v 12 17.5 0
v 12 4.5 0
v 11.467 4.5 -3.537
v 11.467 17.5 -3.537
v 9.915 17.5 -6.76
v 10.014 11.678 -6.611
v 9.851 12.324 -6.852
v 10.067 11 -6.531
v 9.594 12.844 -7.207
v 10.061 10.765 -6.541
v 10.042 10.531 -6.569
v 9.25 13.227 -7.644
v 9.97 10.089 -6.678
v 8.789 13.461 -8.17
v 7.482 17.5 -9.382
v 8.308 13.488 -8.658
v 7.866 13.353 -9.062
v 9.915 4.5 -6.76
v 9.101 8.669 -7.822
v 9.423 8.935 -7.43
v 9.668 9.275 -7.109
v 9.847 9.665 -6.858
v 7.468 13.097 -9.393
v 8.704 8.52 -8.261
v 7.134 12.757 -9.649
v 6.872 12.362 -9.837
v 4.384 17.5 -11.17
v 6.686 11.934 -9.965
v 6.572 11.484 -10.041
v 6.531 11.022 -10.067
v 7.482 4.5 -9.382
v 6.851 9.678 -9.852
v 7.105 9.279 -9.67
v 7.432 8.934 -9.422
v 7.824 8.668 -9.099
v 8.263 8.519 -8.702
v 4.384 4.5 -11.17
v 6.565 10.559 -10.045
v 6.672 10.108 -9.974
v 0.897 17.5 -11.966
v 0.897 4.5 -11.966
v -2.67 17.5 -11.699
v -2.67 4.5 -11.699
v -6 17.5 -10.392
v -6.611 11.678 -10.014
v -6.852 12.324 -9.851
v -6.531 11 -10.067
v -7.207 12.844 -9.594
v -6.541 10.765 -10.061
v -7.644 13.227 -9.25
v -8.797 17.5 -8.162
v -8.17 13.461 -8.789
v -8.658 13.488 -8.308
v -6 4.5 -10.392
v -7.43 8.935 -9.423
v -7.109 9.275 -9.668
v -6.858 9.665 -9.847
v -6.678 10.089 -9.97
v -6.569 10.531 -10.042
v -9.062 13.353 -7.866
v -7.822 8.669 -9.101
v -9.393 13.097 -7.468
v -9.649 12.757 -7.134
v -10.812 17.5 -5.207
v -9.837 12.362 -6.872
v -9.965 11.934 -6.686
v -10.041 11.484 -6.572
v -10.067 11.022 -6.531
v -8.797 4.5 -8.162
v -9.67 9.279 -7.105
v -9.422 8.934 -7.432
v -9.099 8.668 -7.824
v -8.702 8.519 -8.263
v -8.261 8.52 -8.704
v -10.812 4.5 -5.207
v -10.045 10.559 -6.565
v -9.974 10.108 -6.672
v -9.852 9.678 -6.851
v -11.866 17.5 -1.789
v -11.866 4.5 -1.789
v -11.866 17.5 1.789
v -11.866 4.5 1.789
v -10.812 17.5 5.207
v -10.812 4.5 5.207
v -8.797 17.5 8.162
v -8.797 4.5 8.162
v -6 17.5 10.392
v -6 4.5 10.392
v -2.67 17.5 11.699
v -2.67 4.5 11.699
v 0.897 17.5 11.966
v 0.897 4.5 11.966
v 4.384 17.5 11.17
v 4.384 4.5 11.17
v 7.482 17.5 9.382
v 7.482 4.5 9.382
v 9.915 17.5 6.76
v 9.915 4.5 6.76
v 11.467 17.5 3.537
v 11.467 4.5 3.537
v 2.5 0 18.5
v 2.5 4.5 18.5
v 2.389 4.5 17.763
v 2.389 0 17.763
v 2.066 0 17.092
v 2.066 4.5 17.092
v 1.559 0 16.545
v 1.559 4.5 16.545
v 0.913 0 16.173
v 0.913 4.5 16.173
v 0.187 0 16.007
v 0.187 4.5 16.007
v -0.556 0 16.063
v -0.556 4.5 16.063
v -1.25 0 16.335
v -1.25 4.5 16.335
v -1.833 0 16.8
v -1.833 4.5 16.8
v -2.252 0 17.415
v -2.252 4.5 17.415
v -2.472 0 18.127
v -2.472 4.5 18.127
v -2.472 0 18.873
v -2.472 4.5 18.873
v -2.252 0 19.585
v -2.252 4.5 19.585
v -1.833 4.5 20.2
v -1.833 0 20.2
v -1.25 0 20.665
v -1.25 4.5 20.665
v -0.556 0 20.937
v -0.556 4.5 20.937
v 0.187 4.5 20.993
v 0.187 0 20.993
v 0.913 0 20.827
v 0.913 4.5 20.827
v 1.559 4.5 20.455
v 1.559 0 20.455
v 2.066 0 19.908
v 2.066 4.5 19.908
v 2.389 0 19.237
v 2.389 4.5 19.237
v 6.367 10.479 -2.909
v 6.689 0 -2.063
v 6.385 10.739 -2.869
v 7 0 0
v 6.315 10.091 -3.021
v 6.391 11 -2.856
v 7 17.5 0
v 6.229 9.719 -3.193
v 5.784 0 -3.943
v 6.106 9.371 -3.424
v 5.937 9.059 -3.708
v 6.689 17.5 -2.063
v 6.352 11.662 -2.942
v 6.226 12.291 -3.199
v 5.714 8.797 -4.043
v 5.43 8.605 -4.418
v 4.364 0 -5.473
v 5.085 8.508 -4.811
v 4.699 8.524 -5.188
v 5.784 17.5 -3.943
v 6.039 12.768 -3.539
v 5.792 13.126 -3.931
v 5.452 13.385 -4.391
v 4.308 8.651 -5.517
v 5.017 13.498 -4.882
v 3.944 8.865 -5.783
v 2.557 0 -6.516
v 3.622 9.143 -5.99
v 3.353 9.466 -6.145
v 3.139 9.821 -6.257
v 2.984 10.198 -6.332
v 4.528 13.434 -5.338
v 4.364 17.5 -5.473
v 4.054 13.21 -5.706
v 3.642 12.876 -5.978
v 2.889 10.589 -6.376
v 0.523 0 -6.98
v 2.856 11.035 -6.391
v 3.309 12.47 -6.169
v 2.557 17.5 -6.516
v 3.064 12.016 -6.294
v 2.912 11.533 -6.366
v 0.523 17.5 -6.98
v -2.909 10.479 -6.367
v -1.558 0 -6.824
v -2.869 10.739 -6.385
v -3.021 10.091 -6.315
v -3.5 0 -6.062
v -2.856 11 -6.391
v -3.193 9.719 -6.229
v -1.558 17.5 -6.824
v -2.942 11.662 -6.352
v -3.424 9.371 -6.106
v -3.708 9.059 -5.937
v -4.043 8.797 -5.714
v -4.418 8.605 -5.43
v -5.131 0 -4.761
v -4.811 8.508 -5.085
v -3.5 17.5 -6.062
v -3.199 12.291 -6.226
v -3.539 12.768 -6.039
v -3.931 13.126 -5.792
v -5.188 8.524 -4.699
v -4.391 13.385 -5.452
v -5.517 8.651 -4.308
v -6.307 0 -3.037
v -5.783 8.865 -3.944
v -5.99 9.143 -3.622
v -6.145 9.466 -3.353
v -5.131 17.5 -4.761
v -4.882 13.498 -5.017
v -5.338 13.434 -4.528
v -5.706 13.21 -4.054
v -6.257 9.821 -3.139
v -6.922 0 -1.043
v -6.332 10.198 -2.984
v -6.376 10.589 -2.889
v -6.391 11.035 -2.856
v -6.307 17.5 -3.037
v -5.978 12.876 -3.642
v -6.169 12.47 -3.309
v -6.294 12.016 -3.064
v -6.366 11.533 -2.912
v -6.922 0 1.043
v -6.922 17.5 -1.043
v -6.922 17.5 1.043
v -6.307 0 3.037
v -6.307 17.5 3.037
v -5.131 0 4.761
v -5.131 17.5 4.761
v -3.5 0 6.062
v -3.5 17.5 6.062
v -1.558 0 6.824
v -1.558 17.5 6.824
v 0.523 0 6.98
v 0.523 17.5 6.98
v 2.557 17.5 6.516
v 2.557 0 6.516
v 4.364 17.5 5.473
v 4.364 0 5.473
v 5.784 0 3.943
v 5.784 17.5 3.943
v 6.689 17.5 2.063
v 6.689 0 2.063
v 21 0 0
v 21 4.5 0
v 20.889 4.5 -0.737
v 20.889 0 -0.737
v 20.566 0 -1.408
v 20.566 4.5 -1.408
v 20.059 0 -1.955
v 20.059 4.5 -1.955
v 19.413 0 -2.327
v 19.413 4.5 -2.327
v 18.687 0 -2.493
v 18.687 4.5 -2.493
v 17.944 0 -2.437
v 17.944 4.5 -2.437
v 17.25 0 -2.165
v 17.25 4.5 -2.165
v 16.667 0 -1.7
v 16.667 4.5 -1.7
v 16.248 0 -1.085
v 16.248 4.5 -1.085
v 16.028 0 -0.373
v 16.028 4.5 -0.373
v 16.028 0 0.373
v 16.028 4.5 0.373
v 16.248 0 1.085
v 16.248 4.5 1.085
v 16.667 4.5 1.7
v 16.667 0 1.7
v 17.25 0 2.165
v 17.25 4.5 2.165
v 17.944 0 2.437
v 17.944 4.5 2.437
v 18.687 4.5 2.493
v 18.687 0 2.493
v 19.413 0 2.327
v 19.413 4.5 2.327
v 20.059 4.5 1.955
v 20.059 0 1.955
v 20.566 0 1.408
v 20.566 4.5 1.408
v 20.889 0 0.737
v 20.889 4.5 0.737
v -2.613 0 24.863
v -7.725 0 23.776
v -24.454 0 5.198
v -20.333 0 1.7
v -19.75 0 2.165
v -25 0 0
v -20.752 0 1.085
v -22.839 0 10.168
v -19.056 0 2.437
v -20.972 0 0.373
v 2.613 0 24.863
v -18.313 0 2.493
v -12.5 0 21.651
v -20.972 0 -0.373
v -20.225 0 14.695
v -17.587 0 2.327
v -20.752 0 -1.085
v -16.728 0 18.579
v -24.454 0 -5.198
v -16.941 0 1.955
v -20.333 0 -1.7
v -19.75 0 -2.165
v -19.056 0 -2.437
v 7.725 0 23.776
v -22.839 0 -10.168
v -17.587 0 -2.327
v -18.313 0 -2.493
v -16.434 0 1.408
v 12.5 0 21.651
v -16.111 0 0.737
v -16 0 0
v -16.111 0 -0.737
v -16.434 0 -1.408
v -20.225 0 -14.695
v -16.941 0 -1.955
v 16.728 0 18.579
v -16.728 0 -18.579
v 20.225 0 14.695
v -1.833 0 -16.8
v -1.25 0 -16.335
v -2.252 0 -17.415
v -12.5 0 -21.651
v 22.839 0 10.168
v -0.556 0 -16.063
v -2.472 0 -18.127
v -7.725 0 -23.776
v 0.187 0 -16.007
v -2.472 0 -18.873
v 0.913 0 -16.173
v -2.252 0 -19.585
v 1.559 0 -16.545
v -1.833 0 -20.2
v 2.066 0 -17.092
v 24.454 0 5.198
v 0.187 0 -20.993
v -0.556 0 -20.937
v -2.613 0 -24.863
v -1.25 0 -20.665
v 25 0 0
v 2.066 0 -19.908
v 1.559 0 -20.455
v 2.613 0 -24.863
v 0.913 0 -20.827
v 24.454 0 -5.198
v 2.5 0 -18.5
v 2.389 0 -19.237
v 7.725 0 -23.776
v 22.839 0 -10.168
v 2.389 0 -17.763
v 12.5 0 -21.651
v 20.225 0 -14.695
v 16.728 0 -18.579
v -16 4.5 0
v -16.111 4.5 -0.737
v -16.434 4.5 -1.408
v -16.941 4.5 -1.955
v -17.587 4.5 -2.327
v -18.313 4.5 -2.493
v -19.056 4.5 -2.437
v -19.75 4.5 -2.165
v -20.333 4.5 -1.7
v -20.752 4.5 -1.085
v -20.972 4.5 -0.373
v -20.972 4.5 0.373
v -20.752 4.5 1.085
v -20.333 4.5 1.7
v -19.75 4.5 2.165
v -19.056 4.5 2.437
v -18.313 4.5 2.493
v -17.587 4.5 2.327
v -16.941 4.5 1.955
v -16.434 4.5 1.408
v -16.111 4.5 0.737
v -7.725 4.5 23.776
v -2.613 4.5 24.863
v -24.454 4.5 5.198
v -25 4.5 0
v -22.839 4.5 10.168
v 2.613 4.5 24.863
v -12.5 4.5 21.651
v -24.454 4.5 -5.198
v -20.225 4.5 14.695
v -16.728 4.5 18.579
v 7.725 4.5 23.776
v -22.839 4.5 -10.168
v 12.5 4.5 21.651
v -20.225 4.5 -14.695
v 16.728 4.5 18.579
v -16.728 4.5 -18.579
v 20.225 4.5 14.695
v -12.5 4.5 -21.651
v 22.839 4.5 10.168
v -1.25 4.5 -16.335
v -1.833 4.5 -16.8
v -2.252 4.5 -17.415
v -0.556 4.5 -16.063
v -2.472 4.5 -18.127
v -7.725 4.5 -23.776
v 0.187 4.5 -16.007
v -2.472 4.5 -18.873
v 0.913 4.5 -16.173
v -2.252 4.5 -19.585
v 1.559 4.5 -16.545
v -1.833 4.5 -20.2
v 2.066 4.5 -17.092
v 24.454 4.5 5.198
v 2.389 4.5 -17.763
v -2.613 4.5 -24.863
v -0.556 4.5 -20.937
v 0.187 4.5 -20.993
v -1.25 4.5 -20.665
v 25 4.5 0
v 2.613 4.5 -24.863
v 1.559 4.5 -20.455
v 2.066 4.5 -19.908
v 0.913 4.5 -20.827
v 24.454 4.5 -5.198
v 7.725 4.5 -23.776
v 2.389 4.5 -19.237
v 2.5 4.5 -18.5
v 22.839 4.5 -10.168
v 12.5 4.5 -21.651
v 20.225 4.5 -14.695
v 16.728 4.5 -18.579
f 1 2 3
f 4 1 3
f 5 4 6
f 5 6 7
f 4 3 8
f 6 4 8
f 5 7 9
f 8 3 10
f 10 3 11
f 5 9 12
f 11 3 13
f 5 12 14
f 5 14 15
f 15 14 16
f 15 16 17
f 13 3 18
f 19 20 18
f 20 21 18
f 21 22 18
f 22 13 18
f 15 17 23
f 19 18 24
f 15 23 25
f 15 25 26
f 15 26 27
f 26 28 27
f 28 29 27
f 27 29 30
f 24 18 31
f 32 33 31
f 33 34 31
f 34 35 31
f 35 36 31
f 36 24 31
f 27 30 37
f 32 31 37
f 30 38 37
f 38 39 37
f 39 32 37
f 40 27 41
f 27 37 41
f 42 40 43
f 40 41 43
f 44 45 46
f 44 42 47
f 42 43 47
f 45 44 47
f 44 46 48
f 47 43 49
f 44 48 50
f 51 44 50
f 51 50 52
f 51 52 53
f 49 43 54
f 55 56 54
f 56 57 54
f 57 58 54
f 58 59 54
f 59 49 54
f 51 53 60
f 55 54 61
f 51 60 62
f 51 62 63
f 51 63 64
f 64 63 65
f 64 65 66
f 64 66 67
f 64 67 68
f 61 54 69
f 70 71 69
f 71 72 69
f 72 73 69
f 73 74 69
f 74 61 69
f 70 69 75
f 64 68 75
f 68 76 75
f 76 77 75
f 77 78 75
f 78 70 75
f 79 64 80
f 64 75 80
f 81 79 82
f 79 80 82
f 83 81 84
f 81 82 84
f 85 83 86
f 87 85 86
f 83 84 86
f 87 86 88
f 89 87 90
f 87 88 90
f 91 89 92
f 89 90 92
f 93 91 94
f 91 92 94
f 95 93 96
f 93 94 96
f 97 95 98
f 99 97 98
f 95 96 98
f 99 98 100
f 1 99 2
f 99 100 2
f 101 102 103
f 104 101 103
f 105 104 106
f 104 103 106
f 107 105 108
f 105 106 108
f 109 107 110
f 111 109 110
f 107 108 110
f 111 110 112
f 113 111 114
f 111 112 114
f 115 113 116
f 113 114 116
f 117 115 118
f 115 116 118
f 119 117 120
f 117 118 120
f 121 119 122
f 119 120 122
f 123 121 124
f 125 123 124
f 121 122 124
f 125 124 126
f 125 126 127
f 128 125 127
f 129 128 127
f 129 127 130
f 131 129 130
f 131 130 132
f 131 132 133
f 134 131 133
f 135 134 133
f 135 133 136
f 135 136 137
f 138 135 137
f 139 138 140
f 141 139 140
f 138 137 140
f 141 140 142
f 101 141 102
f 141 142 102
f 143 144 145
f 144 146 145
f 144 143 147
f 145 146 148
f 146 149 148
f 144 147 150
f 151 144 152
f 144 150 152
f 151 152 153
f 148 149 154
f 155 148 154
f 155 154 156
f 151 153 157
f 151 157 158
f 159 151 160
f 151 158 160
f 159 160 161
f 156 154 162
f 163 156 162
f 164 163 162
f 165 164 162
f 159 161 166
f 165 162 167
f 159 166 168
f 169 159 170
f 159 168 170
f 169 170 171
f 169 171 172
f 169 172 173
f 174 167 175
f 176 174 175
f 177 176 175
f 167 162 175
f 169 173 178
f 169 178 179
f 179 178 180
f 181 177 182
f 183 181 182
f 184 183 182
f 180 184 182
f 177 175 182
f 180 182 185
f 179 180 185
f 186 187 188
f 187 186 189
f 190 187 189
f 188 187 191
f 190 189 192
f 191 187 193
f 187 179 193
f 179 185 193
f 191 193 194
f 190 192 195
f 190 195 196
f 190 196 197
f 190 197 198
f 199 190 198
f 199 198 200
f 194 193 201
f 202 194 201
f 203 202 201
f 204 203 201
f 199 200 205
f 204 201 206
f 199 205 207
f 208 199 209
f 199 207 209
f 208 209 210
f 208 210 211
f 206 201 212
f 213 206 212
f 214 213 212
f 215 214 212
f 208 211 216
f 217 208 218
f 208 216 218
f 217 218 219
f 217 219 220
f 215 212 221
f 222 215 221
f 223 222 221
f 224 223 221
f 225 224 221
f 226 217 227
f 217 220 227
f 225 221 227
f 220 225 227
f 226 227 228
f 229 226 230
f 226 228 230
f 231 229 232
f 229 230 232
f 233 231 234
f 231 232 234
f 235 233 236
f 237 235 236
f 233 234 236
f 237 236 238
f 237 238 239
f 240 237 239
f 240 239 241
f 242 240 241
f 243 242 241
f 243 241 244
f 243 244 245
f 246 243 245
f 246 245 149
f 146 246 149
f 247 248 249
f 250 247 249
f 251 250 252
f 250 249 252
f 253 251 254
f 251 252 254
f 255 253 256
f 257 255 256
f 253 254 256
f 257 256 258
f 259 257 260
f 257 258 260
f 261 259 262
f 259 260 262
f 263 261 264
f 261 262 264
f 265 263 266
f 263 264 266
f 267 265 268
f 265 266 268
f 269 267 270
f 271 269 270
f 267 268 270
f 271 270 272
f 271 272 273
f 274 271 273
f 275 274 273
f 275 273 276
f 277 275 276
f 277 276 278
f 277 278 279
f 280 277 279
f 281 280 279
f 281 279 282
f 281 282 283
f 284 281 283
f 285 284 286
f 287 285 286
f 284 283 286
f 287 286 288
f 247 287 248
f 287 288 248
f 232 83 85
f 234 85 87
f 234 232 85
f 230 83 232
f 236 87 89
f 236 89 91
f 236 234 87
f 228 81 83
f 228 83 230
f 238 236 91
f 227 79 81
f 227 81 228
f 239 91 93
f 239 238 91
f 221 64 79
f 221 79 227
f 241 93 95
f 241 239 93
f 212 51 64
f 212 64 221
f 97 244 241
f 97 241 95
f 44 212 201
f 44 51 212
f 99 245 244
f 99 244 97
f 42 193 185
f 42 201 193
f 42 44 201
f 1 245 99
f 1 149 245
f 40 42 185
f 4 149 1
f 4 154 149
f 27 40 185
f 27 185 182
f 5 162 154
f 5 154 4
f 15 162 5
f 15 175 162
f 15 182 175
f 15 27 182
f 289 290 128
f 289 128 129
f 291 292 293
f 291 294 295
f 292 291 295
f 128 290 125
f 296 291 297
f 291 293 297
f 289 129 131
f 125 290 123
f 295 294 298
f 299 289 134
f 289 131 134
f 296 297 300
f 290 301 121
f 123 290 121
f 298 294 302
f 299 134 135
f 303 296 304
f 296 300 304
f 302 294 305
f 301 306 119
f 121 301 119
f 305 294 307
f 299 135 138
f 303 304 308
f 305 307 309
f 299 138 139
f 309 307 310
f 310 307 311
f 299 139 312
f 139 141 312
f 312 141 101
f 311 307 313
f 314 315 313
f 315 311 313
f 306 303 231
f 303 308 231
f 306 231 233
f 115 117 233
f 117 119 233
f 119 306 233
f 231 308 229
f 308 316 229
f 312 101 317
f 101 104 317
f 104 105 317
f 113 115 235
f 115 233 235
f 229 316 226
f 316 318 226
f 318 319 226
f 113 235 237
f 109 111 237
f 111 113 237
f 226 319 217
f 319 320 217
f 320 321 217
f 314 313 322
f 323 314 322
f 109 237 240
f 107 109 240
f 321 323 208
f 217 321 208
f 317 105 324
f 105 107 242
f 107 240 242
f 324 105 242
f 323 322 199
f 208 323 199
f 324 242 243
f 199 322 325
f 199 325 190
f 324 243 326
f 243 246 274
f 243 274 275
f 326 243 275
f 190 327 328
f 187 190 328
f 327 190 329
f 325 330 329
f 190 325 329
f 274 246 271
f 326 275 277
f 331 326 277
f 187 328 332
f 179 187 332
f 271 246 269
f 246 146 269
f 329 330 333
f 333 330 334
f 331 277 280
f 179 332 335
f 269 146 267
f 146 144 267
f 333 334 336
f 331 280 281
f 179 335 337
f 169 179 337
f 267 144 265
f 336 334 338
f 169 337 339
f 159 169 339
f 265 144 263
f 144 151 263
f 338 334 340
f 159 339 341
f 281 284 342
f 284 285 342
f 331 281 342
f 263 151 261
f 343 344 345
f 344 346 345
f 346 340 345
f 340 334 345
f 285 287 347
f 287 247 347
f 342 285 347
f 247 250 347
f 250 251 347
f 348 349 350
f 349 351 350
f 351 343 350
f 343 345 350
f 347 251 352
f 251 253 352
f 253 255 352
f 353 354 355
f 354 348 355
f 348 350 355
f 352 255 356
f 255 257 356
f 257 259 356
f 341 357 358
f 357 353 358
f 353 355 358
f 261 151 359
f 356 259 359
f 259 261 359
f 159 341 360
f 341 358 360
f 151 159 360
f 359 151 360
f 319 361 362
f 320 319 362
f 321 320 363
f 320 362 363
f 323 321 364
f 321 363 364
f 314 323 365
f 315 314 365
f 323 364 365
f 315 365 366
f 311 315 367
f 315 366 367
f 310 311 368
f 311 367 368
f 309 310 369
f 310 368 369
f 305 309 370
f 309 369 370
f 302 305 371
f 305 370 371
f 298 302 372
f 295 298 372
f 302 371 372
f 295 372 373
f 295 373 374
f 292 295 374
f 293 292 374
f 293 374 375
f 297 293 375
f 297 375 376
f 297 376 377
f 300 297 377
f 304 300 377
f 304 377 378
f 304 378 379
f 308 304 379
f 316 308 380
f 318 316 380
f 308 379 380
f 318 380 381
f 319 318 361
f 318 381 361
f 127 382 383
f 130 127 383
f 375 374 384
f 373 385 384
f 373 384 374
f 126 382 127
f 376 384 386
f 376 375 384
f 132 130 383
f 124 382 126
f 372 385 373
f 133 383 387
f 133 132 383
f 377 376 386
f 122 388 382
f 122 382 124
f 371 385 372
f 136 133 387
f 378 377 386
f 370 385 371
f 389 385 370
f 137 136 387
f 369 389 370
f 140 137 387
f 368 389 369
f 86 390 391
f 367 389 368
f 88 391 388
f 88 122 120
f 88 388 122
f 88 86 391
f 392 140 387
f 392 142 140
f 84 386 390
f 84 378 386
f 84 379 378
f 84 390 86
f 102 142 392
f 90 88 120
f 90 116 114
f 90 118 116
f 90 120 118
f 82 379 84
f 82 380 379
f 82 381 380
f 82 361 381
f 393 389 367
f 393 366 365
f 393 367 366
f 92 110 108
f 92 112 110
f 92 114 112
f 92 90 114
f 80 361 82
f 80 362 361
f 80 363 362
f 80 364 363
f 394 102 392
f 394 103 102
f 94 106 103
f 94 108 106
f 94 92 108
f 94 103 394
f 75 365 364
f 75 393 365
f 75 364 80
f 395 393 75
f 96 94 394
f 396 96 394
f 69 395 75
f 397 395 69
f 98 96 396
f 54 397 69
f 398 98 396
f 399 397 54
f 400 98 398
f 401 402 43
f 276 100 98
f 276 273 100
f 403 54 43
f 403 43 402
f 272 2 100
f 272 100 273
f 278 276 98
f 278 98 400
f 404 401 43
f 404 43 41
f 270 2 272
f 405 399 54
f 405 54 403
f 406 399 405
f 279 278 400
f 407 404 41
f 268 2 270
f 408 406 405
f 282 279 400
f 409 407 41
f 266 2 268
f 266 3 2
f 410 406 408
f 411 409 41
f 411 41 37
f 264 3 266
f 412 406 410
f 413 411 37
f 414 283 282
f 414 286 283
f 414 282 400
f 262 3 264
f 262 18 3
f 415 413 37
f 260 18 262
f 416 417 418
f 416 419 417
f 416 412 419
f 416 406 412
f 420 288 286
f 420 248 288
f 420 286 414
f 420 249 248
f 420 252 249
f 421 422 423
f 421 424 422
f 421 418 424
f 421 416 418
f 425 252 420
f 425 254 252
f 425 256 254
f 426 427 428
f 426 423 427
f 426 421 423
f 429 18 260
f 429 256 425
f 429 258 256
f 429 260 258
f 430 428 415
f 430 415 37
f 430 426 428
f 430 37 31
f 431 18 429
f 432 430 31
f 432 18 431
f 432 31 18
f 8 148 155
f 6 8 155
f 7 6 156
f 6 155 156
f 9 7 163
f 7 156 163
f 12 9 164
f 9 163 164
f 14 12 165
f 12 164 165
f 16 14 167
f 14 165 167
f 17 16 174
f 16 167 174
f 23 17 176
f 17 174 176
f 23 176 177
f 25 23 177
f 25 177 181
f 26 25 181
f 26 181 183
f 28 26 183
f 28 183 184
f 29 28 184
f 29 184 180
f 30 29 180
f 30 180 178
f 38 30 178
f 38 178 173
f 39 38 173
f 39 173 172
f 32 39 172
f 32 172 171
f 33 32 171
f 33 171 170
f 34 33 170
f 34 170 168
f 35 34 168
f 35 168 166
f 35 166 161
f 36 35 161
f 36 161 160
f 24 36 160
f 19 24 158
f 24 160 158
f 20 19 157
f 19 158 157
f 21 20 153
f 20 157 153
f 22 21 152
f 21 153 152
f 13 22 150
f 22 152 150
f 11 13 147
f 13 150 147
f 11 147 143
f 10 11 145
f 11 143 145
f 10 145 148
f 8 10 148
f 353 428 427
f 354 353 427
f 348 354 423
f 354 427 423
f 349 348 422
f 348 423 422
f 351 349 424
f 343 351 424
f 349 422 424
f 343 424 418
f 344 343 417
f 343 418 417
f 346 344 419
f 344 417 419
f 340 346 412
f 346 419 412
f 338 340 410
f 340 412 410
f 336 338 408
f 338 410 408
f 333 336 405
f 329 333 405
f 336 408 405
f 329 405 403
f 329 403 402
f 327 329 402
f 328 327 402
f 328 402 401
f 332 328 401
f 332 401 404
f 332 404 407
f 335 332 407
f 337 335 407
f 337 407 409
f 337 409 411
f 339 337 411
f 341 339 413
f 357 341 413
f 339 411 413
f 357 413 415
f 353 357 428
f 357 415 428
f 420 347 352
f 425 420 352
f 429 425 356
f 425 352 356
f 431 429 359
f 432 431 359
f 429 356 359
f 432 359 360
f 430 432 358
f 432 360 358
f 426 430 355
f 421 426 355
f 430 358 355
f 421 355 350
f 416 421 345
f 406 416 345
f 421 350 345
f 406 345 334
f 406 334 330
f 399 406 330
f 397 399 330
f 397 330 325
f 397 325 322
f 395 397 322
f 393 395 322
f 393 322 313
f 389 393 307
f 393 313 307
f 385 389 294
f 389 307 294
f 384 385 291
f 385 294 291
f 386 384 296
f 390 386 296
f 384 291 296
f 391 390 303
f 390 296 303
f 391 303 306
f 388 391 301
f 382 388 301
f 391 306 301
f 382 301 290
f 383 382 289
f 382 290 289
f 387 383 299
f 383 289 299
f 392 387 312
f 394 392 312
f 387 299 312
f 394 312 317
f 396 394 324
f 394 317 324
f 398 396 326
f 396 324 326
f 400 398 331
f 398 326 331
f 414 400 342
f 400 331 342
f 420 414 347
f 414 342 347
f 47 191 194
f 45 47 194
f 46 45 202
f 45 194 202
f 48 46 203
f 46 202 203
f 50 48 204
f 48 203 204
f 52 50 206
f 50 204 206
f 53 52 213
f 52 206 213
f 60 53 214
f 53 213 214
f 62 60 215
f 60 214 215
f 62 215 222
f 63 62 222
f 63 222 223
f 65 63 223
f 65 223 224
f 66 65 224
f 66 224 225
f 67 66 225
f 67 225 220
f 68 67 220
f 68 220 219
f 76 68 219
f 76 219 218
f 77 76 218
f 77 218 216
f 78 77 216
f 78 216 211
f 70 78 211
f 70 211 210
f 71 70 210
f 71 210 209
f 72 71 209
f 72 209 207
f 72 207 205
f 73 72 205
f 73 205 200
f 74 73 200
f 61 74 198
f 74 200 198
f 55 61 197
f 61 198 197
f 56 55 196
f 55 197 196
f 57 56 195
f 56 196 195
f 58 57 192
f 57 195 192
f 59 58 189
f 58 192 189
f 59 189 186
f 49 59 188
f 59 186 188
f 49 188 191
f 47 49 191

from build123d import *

# Parameters (mm, degrees)
SKETCH1_R           = 25
BOSS_EXTRUDE1_DEPTH = 4.5
SKETCH2_R           = 12
BOSS_EXTRUDE2_DEPTH = 13
SKETCH3_R           = 7
CUT_EXTRUDE1_DEPTH  = 17.5
SKETCH4_R           = 2.5
CUT_EXTRUDE2_DEPTH  = 4.5
SKETCH5_R           = 2.5
CUT_EXTRUDE3_DEPTH  = 25
CIRPATTERN1_COUNT   = 2
CIRPATTERN1_ANGLE   = 90


with BuildPart() as part:
    # Sketch1 → Boss-Extrude1 (new body)
    with BuildSketch(Plane(origin=(0, 0, 0), x_dir=(1, 0, 0), z_dir=(0, 1, 0))):
        Circle(SKETCH1_R)
    extrude(amount=BOSS_EXTRUDE1_DEPTH)

    # Sketch2 → Boss-Extrude2 (add)
    with BuildSketch(Plane(origin=(0, 4.5, 0), x_dir=(1, 0, 0), z_dir=(0, 1, 0))):
        Circle(SKETCH2_R)
    extrude(amount=BOSS_EXTRUDE2_DEPTH)

    # Sketch3 → Cut-Extrude1 (cut)
    with BuildSketch(Plane(origin=(0, 17.5, 0), x_dir=(1, 0, 0), z_dir=(0, 1, 0))):
        Circle(SKETCH3_R)
    extrude(amount=-CUT_EXTRUDE1_DEPTH, mode=Mode.SUBTRACT)

    # Sketch4 → Cut-Extrude2 (cut)
    with BuildSketch(Plane(origin=(0, 4.5, 0), x_dir=(1, 0, 0), z_dir=(0, 1, 0))):
        with Locations((-18.5, 0)):
            Circle(SKETCH4_R)
        with Locations((0, 18.5)):
            Circle(SKETCH4_R)
        with Locations((18.5, 0)):
            Circle(SKETCH4_R)
        with Locations((0, -18.5)):
            Circle(SKETCH4_R)
    extrude(amount=-CUT_EXTRUDE2_DEPTH, mode=Mode.SUBTRACT)

    # Sketch5 → Cut-Extrude3 (cut)
    with BuildSketch(Plane(origin=(0, 0, 0), x_dir=(0.707106781, 0, 0.707106781), z_dir=(-0.707106781, 0, 0.707106781))):
        with Locations((0, 11)):
            Circle(SKETCH5_R)
    cut_extrude3 = extrude(amount=-CUT_EXTRUDE3_DEPTH, mode=Mode.SUBTRACT)

    # CirPattern1: Cut-Extrude3 ×2 about axis
    cirpattern1_axis = Axis((0, 17.5, 0), (0, 1, 0))
    for i in range(1, CIRPATTERN1_COUNT):
        add(cut_extrude3.rotate(cirpattern1_axis, i * CIRPATTERN1_ANGLE / (CIRPATTERN1_COUNT - 1)), mode=Mode.SUBTRACT)


solid = part.part
